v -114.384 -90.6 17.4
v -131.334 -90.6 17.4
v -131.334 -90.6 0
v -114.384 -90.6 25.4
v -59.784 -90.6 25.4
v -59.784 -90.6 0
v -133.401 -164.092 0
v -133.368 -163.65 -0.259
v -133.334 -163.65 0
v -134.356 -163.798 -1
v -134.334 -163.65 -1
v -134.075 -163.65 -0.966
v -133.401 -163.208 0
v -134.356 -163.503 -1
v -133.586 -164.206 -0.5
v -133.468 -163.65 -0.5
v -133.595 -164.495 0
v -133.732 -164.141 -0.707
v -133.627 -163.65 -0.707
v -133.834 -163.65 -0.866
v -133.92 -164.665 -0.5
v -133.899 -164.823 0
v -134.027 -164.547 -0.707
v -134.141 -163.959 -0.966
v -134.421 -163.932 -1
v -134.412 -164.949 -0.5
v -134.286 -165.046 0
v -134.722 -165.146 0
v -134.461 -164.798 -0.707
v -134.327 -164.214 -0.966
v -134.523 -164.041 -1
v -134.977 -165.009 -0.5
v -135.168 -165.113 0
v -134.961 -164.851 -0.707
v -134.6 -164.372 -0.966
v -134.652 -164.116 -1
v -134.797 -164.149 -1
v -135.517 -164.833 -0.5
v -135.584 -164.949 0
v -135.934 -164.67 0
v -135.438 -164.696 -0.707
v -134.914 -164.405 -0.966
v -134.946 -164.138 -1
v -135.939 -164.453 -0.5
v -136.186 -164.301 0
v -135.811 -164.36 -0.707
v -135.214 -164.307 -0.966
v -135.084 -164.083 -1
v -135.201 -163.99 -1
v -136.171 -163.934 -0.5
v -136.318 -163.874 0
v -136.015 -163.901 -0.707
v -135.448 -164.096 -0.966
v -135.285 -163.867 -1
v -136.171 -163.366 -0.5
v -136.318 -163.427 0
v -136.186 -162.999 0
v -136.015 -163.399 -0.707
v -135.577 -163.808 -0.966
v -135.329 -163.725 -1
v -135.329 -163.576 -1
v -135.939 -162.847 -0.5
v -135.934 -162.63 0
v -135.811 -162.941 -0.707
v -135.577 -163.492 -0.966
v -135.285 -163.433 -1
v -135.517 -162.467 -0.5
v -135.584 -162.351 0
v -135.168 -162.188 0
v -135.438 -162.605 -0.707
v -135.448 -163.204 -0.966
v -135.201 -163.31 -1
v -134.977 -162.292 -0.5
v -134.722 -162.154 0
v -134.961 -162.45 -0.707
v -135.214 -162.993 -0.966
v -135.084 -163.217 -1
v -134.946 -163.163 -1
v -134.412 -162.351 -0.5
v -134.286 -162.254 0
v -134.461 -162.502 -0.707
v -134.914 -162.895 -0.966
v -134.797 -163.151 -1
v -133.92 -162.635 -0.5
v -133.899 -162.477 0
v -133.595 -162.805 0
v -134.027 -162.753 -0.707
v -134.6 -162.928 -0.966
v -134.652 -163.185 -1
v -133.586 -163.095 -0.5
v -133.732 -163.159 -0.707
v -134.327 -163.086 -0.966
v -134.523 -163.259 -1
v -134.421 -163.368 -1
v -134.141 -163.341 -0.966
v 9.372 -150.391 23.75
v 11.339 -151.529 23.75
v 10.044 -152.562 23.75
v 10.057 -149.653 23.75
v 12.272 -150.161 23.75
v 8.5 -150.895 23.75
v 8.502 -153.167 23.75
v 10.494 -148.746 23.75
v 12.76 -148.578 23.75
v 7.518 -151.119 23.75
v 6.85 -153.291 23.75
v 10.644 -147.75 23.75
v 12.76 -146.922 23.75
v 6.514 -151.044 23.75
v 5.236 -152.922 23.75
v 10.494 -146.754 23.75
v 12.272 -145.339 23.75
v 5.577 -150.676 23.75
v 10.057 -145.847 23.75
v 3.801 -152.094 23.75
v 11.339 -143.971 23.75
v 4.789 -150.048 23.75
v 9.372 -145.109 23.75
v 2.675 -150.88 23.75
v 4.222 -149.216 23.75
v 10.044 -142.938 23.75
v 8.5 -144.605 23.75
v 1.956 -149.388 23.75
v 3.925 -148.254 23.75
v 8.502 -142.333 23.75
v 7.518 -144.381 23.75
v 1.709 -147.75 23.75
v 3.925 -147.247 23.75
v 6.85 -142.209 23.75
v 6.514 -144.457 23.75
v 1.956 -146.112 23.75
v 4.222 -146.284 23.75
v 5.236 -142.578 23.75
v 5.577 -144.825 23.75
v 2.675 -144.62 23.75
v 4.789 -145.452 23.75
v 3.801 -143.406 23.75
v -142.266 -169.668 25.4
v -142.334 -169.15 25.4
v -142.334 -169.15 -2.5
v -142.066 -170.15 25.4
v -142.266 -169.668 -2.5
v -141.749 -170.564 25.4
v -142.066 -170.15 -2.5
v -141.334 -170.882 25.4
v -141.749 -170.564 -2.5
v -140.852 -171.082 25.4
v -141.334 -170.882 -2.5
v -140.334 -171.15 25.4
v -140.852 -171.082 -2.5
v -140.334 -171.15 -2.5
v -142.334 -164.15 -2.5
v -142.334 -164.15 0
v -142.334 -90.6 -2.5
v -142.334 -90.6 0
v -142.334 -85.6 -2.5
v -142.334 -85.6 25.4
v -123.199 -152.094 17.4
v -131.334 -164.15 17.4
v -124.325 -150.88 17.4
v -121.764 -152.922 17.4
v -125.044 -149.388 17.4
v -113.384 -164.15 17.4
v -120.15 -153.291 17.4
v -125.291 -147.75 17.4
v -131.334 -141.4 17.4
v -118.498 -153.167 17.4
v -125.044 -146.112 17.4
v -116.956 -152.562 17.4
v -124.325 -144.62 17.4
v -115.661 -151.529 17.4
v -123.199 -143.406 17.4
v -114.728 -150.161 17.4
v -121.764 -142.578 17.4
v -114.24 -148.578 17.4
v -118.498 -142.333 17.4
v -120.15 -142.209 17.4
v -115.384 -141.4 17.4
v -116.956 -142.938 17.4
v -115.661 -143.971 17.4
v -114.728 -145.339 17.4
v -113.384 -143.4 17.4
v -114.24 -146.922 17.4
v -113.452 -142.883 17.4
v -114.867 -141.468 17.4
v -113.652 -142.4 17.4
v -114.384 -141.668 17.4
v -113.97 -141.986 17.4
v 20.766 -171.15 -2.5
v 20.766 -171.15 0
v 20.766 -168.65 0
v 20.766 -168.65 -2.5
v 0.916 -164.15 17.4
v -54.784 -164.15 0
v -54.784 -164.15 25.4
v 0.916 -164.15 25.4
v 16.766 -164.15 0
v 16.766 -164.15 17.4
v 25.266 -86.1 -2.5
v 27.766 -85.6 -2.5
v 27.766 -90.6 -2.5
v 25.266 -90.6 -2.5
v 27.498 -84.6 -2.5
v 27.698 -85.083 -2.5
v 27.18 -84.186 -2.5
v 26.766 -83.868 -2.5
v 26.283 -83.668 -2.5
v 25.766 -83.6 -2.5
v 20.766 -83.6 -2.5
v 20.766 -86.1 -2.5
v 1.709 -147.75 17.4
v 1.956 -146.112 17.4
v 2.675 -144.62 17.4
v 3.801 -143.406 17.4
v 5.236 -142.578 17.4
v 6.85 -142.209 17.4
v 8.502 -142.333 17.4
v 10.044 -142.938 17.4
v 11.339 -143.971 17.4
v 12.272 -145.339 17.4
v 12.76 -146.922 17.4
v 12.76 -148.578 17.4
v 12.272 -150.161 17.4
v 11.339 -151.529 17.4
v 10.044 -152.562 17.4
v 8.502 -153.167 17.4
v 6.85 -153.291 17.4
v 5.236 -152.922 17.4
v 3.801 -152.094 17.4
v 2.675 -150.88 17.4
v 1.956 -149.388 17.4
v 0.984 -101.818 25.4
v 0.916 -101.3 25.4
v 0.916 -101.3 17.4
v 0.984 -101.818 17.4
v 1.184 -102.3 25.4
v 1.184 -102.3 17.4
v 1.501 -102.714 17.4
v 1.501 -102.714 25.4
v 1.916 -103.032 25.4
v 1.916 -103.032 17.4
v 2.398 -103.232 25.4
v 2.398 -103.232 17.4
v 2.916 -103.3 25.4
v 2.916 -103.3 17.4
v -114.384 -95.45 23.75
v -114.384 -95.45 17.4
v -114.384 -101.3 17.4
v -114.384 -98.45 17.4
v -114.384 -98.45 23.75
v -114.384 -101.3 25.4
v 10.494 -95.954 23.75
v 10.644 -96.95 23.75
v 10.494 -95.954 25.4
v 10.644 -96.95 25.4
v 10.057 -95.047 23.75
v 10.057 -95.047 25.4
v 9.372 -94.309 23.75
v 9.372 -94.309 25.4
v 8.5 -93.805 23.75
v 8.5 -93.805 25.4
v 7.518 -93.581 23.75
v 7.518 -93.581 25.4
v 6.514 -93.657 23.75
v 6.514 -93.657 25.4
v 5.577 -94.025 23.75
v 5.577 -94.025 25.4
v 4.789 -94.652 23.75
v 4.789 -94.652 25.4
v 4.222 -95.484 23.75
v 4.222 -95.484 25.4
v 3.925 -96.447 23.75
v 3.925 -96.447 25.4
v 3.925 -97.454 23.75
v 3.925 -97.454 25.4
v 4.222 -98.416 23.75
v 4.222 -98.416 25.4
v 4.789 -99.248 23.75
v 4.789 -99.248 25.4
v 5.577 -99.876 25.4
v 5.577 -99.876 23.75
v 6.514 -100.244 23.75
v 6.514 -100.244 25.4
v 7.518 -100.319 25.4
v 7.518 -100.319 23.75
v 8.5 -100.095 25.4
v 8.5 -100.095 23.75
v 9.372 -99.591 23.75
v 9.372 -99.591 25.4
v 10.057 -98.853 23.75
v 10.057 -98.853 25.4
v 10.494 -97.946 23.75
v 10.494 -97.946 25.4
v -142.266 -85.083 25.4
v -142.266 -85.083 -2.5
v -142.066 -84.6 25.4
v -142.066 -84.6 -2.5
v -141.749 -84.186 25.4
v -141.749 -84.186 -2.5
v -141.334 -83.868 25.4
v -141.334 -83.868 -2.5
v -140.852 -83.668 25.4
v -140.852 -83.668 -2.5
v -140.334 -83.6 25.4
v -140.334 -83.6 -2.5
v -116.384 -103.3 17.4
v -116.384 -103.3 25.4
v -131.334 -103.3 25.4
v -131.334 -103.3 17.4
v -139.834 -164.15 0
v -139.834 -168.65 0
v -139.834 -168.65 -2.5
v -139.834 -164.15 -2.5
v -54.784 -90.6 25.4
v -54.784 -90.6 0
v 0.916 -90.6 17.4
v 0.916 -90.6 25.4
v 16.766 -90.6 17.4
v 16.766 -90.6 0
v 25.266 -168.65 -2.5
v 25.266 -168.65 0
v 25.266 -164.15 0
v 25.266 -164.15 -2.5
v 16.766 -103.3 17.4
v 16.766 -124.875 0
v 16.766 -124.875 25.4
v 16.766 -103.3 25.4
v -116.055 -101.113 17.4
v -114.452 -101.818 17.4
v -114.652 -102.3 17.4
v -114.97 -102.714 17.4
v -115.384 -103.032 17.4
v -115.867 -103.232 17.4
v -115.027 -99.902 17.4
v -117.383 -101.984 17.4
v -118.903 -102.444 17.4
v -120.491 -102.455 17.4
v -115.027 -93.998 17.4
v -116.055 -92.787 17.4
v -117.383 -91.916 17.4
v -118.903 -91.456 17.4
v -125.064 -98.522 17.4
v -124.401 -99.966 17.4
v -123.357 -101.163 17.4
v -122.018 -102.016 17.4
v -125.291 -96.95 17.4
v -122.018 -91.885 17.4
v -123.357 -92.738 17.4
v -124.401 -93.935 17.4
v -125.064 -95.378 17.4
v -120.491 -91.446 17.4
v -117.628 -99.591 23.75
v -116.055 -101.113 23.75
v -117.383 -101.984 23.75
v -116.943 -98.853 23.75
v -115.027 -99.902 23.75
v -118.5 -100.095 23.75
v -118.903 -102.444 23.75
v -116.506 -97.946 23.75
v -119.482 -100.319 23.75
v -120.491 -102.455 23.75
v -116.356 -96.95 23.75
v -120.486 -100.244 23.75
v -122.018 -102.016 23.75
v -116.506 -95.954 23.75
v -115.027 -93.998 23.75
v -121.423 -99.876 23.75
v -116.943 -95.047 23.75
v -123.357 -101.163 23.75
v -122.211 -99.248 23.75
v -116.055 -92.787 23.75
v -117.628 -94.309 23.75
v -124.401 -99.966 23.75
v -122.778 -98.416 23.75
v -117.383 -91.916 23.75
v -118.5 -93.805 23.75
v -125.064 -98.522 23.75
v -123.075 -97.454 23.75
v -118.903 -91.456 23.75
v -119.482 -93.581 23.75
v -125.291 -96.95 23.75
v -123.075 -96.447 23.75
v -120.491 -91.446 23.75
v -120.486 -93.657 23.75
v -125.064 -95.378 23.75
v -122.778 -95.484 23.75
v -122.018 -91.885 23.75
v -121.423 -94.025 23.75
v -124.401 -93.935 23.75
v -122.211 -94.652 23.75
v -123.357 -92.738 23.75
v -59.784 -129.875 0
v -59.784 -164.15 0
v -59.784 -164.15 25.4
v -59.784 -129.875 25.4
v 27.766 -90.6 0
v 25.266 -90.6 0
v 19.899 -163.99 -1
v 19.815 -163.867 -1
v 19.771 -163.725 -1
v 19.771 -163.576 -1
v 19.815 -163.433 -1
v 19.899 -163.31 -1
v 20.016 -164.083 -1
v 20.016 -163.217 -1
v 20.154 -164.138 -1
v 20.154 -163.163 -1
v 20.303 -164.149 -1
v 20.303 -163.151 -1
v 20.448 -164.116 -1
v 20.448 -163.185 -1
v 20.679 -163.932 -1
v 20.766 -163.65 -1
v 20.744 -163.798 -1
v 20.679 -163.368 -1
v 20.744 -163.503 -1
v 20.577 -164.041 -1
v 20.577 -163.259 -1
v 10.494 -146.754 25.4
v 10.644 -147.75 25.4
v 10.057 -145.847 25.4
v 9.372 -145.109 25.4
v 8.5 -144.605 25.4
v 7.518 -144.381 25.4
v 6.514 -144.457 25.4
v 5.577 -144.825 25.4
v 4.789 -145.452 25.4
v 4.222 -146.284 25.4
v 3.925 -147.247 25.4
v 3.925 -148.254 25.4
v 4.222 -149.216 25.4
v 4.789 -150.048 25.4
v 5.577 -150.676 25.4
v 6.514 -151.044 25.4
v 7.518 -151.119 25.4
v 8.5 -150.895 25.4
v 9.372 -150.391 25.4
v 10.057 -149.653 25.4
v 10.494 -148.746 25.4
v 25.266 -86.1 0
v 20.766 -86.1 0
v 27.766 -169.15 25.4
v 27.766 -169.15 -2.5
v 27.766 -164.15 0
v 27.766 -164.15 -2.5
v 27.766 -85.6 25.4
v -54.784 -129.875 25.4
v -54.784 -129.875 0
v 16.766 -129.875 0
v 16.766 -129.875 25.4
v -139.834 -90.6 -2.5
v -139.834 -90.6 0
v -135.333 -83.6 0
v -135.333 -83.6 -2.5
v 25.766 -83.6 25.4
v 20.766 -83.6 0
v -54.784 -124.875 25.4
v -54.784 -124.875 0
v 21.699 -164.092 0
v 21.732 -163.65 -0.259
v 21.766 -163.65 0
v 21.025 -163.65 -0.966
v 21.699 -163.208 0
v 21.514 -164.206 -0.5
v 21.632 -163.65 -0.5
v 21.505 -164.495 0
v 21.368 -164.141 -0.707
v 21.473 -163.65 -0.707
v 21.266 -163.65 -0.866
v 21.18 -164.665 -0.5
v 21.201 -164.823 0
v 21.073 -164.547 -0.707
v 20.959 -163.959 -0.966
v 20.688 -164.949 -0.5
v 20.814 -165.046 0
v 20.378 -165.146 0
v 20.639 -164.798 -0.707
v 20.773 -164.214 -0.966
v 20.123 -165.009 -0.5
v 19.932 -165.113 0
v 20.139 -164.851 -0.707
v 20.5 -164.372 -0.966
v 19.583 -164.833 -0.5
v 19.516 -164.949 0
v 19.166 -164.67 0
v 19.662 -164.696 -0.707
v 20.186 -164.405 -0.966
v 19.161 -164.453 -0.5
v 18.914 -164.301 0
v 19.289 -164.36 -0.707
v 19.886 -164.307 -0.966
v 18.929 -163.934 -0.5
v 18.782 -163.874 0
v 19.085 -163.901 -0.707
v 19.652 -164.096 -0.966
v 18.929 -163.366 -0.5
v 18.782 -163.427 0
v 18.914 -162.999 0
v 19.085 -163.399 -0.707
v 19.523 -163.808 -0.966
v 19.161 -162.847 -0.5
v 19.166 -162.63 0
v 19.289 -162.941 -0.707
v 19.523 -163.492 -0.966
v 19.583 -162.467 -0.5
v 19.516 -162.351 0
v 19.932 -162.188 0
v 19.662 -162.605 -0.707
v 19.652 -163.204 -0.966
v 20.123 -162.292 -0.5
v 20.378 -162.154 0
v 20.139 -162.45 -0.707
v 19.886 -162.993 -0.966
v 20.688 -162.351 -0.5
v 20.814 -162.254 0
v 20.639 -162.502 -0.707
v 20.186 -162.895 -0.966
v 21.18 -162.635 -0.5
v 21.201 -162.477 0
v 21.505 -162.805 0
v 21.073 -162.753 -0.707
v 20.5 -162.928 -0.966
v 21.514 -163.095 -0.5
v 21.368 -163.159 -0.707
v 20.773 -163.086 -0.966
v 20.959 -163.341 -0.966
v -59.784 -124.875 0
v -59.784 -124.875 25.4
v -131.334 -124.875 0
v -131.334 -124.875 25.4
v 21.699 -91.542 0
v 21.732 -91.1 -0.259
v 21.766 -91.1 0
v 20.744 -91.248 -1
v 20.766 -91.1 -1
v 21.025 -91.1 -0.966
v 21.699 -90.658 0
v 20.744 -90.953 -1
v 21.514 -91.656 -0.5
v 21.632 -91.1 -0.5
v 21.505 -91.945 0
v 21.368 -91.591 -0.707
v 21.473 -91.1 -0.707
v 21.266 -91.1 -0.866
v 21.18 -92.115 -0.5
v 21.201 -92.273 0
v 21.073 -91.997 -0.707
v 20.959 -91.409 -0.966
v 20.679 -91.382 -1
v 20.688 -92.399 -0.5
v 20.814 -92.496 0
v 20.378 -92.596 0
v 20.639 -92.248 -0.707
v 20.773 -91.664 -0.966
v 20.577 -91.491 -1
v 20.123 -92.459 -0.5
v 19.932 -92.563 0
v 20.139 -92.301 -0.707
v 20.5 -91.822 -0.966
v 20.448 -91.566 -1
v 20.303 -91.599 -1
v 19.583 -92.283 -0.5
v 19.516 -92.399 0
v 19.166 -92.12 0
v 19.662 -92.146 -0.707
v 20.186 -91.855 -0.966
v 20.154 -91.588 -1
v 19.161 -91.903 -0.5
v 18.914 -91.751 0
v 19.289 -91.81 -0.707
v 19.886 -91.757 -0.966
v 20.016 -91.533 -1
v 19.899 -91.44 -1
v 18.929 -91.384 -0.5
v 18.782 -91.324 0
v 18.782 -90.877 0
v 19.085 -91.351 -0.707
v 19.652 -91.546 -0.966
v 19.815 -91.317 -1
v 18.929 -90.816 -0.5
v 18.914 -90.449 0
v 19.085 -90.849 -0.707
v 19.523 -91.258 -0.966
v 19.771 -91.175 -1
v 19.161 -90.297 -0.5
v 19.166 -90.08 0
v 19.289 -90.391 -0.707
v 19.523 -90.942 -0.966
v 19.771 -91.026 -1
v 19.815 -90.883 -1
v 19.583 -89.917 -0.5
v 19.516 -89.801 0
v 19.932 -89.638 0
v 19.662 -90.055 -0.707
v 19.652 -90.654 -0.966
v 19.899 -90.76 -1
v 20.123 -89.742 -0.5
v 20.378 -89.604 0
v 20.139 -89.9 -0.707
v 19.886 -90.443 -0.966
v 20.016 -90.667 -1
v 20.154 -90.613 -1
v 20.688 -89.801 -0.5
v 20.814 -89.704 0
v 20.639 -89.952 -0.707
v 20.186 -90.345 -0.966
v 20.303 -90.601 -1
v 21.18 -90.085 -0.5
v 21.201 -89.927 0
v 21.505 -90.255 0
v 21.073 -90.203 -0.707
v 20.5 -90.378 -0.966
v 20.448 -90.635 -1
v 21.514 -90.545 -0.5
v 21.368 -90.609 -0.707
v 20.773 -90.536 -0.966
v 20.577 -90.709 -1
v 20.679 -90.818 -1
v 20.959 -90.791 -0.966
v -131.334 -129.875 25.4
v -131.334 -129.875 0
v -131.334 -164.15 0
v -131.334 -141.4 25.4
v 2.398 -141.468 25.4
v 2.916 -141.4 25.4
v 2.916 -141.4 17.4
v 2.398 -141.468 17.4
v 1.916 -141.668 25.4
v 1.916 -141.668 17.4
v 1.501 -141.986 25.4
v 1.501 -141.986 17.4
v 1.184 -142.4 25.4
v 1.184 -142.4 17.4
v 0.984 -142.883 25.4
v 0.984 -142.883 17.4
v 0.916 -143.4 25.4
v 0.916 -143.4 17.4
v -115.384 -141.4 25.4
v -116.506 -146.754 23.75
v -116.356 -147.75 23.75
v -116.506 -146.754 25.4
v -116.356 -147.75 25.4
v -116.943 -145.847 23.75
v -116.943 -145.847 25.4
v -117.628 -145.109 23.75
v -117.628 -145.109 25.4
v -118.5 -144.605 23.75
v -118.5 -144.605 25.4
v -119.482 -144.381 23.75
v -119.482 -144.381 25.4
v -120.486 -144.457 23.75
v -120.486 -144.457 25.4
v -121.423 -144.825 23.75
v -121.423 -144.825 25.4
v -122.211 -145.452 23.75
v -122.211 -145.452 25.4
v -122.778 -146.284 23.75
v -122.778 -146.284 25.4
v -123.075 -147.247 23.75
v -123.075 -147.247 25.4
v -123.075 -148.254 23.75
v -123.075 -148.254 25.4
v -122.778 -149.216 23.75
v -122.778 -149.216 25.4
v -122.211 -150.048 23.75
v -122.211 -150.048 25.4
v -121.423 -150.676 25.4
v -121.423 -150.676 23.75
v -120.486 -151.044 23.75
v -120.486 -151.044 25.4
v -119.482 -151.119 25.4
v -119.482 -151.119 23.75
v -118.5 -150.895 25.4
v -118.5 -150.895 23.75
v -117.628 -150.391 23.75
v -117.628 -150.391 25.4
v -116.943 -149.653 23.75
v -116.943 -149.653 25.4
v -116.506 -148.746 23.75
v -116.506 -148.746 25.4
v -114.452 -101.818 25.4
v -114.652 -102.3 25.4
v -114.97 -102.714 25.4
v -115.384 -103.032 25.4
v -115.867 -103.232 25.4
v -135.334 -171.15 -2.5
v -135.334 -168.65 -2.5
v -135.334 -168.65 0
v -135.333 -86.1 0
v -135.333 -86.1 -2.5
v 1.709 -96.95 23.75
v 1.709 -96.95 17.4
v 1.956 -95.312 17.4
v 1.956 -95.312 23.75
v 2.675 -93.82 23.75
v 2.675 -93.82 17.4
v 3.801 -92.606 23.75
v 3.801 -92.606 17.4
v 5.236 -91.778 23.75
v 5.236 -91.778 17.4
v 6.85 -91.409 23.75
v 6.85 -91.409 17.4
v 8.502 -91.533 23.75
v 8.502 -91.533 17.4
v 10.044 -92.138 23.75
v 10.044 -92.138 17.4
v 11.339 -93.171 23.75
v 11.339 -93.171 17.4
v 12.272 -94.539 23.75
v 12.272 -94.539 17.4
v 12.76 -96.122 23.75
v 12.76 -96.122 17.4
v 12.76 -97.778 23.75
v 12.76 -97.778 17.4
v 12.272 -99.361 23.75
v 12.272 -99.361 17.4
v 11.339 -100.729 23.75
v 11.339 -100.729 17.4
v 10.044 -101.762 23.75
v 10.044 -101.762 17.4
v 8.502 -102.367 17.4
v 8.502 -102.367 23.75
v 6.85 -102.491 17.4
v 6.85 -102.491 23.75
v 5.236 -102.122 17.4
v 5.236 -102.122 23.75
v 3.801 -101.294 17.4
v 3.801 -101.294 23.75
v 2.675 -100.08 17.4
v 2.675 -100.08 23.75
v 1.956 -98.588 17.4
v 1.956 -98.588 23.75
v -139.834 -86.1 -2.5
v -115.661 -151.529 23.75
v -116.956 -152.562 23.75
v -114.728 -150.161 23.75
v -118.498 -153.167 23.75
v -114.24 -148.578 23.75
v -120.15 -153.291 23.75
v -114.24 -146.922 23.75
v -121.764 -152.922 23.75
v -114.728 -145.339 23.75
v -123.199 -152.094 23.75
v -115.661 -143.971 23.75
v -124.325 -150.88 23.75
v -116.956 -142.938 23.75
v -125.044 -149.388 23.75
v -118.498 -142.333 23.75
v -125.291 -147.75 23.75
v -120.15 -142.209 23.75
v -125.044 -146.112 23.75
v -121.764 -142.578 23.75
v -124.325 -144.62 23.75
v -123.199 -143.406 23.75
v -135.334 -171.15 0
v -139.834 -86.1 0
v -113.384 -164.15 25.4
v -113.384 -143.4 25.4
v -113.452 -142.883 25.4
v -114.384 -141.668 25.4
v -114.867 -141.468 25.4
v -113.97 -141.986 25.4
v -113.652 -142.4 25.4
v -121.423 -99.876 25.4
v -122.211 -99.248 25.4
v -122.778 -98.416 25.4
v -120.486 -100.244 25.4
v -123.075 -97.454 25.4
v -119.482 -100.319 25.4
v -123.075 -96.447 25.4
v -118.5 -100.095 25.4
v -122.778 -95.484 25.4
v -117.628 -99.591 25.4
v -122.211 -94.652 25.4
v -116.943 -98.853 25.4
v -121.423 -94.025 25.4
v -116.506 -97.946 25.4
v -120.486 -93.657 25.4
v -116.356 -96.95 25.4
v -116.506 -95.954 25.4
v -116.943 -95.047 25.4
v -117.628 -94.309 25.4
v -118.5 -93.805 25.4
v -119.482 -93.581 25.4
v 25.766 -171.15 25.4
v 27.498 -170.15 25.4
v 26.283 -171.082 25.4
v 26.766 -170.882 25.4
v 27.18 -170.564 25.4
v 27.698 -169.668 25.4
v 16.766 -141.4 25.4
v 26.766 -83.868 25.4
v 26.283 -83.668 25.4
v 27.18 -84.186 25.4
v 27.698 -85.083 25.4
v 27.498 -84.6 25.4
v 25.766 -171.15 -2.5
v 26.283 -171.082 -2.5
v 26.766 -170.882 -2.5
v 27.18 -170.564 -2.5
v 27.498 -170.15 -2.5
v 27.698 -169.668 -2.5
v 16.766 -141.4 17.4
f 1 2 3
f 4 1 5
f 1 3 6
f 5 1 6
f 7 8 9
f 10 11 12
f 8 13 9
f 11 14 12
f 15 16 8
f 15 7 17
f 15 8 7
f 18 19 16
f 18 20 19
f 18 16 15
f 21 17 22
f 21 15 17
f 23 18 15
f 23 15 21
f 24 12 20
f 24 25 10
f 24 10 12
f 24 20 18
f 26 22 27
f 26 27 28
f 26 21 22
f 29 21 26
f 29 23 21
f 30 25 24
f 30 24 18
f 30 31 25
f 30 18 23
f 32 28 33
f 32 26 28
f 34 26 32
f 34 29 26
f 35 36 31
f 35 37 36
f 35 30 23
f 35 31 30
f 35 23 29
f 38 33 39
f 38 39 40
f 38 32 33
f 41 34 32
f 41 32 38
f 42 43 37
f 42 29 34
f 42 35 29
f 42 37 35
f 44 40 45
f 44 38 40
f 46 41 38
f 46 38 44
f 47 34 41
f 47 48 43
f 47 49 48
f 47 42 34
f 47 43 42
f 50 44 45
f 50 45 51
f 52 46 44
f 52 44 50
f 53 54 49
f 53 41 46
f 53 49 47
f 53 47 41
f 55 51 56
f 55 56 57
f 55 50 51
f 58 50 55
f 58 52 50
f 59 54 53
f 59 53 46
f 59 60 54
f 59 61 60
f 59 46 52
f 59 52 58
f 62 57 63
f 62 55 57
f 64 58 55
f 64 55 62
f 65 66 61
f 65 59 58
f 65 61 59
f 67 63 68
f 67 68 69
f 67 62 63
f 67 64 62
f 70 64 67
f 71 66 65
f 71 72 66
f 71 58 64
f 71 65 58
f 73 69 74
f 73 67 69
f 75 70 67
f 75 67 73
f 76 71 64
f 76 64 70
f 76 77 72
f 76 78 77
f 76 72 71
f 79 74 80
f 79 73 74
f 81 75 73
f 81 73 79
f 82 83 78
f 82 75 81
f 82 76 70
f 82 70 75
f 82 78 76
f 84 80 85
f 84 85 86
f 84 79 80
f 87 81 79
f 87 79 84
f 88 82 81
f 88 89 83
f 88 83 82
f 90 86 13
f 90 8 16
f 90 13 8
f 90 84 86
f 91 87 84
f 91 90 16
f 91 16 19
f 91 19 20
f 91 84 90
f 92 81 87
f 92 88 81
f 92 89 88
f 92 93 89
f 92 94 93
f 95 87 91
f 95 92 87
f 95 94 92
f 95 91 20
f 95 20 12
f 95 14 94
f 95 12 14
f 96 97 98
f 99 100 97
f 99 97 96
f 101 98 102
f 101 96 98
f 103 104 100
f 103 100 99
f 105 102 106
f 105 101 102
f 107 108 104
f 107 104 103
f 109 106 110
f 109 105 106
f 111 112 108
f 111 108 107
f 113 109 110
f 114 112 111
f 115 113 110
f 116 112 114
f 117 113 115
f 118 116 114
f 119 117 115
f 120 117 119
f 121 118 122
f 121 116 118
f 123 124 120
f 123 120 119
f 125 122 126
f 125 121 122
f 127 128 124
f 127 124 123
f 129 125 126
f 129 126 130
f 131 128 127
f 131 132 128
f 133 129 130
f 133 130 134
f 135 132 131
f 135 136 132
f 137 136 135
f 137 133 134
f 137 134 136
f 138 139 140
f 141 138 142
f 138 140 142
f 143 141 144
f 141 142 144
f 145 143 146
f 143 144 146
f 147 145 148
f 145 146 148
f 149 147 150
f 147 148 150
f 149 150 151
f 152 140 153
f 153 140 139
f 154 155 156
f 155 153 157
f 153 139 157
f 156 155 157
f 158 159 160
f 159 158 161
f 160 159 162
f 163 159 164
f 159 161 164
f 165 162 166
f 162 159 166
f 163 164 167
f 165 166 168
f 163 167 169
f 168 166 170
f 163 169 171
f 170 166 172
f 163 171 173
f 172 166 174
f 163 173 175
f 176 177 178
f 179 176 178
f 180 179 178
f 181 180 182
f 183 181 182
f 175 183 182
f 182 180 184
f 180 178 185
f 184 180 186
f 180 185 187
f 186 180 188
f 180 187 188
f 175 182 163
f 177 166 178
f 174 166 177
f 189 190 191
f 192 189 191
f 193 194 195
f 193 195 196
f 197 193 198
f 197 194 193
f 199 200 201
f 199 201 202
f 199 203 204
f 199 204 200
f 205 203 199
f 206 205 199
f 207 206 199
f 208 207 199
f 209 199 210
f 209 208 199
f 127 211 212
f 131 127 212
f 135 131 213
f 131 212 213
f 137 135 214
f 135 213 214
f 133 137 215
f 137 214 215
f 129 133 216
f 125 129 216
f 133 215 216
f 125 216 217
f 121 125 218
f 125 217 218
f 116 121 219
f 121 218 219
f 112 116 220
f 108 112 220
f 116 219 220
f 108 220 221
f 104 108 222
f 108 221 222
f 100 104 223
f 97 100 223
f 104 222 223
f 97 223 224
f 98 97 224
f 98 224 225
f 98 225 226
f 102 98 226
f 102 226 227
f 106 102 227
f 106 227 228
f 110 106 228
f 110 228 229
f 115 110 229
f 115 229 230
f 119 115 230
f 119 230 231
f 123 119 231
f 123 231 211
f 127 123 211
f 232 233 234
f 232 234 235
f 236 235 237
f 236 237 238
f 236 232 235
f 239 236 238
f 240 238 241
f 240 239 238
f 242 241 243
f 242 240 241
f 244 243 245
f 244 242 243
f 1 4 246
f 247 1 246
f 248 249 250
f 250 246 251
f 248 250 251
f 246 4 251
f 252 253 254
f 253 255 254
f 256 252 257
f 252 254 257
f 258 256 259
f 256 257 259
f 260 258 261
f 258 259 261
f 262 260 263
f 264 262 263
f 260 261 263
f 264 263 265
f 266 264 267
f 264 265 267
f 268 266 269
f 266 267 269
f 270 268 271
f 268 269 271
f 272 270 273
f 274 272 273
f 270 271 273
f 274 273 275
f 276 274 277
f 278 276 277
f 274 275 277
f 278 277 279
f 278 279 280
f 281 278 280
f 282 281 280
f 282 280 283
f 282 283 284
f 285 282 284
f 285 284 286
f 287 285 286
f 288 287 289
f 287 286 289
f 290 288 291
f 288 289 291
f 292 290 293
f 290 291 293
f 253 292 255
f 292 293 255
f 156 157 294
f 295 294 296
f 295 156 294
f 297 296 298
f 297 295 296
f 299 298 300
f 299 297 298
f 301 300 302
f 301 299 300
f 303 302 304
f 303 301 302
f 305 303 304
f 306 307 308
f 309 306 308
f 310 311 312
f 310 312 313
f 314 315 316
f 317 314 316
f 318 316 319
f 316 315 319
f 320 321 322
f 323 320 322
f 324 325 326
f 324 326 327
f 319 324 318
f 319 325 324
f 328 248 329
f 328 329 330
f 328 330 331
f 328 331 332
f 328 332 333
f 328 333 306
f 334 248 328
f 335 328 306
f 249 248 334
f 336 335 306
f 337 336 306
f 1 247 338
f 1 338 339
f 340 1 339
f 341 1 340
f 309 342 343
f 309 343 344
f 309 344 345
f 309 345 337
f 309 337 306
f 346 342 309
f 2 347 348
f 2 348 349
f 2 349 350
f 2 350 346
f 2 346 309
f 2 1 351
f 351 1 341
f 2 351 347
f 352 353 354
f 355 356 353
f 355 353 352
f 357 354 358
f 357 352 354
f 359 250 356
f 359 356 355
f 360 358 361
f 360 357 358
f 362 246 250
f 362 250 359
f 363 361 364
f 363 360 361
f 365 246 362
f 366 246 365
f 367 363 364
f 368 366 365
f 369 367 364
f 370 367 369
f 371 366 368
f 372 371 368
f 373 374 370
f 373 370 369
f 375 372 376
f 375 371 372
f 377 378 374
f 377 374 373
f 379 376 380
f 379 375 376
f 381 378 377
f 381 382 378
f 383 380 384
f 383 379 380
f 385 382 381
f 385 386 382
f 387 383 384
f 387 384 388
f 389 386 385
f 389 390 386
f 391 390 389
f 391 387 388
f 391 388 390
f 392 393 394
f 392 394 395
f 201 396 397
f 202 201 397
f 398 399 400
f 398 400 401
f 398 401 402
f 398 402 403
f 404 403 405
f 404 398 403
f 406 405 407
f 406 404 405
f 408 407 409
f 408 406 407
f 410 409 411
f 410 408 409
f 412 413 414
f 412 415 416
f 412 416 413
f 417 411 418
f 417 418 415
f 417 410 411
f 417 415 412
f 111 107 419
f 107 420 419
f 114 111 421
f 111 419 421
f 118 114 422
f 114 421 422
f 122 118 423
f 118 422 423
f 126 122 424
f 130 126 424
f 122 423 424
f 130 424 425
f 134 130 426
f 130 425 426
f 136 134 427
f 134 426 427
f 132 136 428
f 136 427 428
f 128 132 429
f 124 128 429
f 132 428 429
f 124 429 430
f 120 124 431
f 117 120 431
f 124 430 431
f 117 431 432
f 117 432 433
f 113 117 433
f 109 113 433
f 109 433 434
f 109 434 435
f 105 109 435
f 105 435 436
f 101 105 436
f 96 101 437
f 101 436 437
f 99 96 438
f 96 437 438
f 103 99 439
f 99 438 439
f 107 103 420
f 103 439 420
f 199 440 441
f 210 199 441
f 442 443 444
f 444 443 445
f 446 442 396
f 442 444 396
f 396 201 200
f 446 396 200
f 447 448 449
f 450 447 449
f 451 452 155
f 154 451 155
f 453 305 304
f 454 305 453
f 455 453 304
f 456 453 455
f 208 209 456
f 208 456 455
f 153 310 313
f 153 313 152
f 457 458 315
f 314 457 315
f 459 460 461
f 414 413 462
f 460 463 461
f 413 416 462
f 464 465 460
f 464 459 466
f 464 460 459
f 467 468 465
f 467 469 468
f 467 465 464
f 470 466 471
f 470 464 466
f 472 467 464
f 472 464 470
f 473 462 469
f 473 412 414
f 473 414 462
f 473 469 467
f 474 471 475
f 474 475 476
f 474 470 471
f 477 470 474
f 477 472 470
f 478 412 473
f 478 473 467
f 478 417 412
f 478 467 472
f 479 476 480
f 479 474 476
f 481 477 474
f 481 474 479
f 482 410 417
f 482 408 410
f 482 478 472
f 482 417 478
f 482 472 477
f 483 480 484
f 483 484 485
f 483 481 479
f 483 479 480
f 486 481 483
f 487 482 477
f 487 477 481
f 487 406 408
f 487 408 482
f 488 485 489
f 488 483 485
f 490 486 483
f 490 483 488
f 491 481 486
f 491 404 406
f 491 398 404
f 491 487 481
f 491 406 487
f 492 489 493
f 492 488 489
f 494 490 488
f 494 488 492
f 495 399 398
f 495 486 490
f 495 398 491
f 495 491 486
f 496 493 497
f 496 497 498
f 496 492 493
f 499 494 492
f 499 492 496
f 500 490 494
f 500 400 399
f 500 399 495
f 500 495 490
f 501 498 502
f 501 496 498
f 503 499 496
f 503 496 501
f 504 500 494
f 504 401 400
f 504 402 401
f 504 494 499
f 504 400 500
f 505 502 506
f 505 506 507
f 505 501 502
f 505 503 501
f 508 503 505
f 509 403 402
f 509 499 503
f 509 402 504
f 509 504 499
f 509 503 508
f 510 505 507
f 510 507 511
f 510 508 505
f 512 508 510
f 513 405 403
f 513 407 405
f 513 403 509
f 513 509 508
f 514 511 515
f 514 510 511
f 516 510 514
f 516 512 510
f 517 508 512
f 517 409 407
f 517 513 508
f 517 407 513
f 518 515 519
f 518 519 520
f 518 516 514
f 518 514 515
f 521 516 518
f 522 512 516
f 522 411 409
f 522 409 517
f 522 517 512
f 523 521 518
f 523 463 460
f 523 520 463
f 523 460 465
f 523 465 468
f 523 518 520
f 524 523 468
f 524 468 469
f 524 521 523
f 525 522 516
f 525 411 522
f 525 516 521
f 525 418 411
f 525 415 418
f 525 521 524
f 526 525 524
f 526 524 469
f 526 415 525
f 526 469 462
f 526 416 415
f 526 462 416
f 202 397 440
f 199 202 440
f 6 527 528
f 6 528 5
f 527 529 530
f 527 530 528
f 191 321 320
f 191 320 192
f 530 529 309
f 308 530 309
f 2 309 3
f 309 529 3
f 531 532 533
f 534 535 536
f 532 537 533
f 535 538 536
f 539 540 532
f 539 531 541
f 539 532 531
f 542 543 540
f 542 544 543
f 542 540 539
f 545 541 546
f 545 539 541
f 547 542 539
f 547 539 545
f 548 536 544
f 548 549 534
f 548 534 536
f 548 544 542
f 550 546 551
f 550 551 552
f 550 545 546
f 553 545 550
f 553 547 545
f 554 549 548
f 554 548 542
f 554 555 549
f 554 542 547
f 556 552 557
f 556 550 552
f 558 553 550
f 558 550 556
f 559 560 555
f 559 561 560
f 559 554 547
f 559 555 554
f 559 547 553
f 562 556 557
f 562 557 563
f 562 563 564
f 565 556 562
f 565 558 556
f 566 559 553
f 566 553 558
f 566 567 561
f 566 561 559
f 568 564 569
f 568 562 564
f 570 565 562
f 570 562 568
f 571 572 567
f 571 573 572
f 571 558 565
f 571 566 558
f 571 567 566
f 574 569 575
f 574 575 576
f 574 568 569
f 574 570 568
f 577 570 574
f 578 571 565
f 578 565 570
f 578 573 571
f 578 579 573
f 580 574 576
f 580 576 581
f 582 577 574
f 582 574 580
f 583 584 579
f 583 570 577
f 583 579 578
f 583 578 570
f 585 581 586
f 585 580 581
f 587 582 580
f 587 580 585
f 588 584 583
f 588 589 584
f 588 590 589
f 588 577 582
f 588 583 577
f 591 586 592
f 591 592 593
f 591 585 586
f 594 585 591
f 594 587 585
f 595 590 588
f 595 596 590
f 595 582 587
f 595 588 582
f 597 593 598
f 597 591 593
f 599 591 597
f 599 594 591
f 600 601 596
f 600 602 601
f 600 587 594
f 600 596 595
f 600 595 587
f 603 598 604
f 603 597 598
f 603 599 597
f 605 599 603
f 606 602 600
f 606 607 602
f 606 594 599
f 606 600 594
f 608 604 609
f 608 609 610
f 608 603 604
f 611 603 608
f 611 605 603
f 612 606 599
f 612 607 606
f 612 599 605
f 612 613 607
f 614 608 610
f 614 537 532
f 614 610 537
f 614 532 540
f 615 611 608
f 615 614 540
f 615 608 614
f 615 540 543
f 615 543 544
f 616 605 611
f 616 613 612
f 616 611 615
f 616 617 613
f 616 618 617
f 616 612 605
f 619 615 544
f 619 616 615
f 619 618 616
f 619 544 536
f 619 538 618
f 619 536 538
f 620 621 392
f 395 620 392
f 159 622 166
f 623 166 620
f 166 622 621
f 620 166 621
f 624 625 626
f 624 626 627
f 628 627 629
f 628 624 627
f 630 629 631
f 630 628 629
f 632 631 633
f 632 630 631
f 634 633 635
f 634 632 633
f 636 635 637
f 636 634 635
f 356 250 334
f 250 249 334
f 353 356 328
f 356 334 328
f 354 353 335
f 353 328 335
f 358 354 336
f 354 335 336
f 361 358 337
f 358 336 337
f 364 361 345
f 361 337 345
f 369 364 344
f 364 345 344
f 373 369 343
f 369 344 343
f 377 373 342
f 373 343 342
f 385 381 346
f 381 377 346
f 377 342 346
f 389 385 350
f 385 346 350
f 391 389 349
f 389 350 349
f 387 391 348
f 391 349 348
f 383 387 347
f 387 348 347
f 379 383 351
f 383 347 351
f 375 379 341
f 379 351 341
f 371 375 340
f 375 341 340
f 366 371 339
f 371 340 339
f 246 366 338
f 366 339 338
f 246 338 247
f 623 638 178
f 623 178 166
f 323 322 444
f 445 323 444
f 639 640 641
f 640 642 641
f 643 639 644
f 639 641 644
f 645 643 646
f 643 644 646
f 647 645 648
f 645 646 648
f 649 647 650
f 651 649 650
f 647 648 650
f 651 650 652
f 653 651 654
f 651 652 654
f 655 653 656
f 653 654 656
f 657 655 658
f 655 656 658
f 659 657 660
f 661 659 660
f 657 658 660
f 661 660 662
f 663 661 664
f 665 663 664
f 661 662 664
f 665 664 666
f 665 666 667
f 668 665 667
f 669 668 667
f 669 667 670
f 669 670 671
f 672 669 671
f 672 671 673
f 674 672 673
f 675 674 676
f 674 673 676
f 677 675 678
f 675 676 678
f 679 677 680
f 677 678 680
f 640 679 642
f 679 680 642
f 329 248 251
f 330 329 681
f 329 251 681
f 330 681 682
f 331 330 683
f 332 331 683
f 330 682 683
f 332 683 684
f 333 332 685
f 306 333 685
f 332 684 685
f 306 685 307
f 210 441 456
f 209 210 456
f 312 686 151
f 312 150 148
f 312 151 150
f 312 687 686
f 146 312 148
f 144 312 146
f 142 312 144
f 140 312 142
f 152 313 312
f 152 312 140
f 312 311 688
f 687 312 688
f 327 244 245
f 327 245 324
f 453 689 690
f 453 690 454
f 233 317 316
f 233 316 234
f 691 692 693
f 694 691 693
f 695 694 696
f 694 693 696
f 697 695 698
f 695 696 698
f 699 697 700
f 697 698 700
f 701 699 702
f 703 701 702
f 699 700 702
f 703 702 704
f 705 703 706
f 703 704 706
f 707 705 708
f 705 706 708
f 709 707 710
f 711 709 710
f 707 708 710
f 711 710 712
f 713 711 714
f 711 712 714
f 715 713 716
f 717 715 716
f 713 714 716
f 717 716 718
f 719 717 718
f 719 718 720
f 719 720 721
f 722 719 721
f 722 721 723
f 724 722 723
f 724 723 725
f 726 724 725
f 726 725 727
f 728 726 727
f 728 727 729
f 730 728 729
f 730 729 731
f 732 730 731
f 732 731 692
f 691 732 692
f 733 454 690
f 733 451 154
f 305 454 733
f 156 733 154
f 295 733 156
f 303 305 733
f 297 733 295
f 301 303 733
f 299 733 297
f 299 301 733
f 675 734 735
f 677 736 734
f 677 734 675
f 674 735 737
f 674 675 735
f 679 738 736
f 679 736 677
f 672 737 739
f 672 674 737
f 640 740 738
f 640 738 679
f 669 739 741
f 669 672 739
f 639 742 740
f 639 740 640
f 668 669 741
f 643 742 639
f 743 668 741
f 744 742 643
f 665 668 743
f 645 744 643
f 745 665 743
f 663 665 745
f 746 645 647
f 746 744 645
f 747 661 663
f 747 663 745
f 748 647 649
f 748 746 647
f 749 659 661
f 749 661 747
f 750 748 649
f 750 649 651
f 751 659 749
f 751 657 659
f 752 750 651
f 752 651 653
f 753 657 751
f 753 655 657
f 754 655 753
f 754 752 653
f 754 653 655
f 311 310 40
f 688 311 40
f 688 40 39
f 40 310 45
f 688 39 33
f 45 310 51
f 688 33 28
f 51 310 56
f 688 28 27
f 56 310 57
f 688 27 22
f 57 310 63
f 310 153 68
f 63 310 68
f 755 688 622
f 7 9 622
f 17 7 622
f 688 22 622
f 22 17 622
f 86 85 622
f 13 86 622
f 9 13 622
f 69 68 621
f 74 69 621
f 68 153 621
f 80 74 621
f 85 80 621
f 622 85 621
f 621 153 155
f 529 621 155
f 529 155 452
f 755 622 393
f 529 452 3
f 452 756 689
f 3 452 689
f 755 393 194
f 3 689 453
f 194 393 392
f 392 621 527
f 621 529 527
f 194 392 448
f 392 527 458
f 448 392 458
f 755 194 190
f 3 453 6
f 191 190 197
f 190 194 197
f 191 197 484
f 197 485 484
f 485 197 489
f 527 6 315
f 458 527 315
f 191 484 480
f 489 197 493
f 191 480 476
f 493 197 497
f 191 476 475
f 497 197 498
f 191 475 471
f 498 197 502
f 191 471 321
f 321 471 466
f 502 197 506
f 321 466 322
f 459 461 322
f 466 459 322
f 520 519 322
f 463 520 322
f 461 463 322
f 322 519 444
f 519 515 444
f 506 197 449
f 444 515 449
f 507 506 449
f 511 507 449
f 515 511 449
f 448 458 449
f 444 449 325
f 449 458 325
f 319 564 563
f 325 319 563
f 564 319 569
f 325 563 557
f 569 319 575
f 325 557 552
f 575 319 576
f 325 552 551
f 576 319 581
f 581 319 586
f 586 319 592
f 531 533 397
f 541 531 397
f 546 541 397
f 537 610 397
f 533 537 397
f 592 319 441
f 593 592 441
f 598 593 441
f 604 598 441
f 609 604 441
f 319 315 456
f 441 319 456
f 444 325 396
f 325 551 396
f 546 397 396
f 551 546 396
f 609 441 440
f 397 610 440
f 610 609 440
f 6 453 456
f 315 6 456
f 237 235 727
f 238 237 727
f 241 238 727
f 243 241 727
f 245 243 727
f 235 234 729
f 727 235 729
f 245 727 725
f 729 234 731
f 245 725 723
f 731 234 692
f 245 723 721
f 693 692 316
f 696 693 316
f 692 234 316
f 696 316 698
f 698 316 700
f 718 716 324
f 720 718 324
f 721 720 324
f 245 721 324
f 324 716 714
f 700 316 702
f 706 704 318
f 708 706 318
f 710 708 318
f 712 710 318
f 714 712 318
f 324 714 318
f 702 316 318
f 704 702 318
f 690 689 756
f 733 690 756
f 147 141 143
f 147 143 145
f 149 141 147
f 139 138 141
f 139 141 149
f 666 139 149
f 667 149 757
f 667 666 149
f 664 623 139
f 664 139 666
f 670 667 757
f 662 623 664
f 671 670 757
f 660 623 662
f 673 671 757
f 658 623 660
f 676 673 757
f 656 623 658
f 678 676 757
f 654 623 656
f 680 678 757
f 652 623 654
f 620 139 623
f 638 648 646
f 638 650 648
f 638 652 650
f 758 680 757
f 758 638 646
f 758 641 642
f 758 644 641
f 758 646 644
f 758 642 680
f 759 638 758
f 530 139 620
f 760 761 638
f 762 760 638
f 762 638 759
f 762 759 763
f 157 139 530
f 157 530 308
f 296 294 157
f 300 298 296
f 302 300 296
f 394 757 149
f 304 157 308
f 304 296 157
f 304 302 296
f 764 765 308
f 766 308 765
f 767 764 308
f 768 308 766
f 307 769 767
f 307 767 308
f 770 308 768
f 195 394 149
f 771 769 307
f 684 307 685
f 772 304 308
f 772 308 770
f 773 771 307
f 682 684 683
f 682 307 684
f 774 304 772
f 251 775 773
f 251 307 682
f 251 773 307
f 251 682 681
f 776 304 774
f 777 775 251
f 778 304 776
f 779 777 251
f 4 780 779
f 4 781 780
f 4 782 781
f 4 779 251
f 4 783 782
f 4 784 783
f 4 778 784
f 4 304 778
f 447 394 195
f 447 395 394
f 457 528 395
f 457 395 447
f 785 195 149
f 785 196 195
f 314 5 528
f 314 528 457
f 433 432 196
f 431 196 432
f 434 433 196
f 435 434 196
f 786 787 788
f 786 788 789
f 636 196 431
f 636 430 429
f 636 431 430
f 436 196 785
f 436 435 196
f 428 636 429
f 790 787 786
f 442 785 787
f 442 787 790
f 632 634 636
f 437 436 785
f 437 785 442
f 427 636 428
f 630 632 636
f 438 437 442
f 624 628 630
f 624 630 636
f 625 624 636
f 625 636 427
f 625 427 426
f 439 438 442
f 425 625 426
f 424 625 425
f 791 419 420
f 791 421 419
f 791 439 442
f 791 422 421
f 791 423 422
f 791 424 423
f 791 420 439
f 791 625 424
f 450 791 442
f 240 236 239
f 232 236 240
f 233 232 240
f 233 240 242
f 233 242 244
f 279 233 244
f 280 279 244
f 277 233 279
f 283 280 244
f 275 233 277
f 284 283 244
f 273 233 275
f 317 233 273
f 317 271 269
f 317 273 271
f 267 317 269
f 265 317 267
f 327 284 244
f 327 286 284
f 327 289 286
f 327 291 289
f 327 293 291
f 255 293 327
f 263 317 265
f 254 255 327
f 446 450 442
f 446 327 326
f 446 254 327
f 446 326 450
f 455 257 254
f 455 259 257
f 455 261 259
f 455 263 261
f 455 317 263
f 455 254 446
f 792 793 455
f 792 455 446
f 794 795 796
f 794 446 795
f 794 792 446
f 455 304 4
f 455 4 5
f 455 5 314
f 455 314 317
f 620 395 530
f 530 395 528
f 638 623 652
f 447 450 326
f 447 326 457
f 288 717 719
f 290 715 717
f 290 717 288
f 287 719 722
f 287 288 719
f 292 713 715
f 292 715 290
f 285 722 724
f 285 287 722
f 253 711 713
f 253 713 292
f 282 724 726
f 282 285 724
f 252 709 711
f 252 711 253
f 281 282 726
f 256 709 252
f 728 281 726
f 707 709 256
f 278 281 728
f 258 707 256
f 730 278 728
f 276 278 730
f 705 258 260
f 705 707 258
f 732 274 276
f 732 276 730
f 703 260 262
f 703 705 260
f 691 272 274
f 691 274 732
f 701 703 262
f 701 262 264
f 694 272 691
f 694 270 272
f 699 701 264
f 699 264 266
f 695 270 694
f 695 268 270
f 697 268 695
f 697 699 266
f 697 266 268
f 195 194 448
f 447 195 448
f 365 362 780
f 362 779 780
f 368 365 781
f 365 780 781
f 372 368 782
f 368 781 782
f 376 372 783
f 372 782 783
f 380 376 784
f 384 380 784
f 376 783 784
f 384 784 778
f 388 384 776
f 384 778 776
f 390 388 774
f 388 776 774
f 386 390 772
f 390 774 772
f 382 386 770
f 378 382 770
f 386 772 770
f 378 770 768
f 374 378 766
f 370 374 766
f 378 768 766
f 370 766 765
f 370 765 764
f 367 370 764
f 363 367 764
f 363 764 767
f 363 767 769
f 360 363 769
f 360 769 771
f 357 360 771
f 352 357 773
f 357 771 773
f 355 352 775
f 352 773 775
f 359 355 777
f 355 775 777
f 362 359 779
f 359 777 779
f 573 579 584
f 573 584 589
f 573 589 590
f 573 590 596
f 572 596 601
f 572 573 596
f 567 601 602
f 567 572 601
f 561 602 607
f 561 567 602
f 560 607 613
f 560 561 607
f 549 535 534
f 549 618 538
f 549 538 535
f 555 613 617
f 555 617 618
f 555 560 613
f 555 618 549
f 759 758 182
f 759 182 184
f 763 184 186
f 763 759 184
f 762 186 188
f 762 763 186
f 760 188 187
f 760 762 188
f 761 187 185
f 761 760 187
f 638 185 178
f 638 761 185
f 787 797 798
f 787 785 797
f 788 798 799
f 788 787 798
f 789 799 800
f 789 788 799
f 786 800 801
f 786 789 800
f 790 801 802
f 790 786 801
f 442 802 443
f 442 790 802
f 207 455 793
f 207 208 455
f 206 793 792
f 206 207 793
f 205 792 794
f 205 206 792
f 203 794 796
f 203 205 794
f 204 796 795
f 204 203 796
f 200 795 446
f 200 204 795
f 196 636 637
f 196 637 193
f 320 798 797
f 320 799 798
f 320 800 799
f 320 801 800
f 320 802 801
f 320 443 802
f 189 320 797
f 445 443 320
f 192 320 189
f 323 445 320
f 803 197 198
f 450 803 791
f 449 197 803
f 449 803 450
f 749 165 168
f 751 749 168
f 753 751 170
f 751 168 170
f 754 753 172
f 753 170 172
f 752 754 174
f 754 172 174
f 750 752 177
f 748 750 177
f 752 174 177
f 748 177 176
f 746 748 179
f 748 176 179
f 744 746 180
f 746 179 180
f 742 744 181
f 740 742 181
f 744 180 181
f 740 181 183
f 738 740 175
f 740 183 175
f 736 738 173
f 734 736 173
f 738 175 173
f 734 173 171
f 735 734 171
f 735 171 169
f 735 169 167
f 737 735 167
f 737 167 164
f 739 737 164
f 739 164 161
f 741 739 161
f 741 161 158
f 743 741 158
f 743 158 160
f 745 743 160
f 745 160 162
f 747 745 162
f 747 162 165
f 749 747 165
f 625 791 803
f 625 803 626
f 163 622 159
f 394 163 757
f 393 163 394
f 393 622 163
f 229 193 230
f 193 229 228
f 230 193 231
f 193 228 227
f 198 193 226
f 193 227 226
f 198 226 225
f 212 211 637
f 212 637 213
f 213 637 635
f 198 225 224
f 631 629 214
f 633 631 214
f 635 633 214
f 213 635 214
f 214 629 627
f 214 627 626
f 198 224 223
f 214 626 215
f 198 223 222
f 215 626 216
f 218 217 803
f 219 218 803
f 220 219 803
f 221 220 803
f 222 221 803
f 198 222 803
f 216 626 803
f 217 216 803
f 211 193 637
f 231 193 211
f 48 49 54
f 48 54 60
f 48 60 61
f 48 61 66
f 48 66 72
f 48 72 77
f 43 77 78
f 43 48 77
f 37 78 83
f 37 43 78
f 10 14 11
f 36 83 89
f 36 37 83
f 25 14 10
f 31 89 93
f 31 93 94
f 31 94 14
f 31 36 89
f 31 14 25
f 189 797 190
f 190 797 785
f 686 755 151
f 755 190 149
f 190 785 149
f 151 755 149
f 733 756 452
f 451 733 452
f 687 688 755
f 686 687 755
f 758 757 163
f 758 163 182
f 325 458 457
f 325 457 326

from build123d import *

# Parameters (mm, degrees)
SKETCH1_W                                        = 170.1
SKETCH1_H                                        = 87.55
SKETCH1_W_2                                      = 148.1
SKETCH1_H_2                                      = 73.55
SKETCH1_W_3                                      = 71.55
SKETCH1_H_3                                      = 5
SKETCH1_W_4                                      = 5
SKETCH1_H_4                                      = 34.275
BOSS_EXTRUDE1_DEPTH                              = 25.4
SKETCH2_W                                        = 2.5
SKETCH2_H                                        = 4.5
SKETCH2_W_2                                      = 4.501529918
SKETCH2_H_2                                      = 2.5
SKETCH2_W_3                                      = 4.5
BOSS_EXTRUDE2_DEPTH                              = 2.5
SKETCH3_R                                        = 1.5
BOSS_EXTRUDE3_DEPTH                              = 1
BOSS_EXTRUDE4_DEPTH                              = 8
CBORE_FOR_1_4_SOCKET_HEAD_CAP_SCREW1_D           = 6.7564
CBORE_FOR_1_4_SOCKET_HEAD_CAP_SCREW1_CBORE_D     = 11.1125
CBORE_FOR_1_4_SOCKET_HEAD_CAP_SCREW1_CBORE_DEPTH = 6.35
FILLET1_R                                        = 1
FILLET2_R                                        = 2


with BuildPart() as part:
    # Sketch1 → Boss-Extrude1 (new body)
    # profile 1 of 6: a face of its own
    with BuildSketch(Plane.XY):
        with Locations((-57.284342841, -127.375162174)):
            Rectangle(SKETCH1_W, SKETCH1_H)
        with Locations((-57.284342841, -127.375162174)):
            Rectangle(SKETCH1_W_2, SKETCH1_H_2, mode=Mode.SUBTRACT)
    # profile 2 of 6: a face of its own
    with BuildSketch(Plane.XY):
        with Locations((-95.559342841, -127.375162174)):
            Rectangle(SKETCH1_W_3, SKETCH1_H_3)
    # profile 3 of 6: a face of its own
    with BuildSketch(Plane.XY):
        with Locations((-57.284342841, -107.737662174)):
            Rectangle(SKETCH1_W_4, SKETCH1_H_4)
    # profile 4 of 6: a face of its own
    with BuildSketch(Plane.XY):
        with Locations((-19.009342841, -127.375162174)):
            Rectangle(SKETCH1_W_3, SKETCH1_H_3)
    # profile 5 of 6: a face of its own
    with BuildSketch(Plane.XY):
        with Locations((-57.284342841, -147.012662174)):
            Rectangle(SKETCH1_W_4, SKETCH1_H_4)
    # profile 6 of 6: a face of its own
    with BuildSketch(Plane.XY):
        with Locations((-57.284342841, -127.375162174)):
            Rectangle(SKETCH1_W_4, SKETCH1_H_3)
    extrude(amount=BOSS_EXTRUDE1_DEPTH)

    # Sketch2 → Boss-Extrude2 (add)
    with BuildSketch(Plane(origin=(0, 0, 0), x_dir=(-1, 0, 0), z_dir=(0, 0, -1))):
        Polygon((135.334342841, -168.650162174), (135.334342841, -171.150162174), (142.334342841, -171.150162174), (142.334342841, -168.650162174), (139.834342841, -168.650162174), align=None)
        with Locations((141.084342841, -166.400162174)):
            Rectangle(SKETCH2_W, SKETCH2_H)
        Polygon((139.834342841, -90.600162174), (142.334342841, -90.600162174), (142.334342841, -83.600162174), (139.834342841, -83.600162174), (139.834342841, -86.100162174), align=None)
        with Locations((137.583577882, -84.850162174)):
            Rectangle(SKETCH2_W_2, SKETCH2_H_2)
        Polygon((-27.765657159, -83.600162174), (-27.765657159, -90.600162174), (-25.265657159, -90.600162174), (-25.265657159, -86.100162174), (-25.265657159, -83.600162174), align=None)
        with Locations((-23.015657159, -84.850162174)):
            Rectangle(SKETCH2_W_3, SKETCH2_H_2)
        Polygon((-27.765657159, -164.150162174), (-27.765657159, -171.150162174), (-25.265657159, -171.150162174), (-25.265657159, -168.650162174), (-25.265657159, -164.150162174), align=None)
        with Locations((-23.015657159, -169.900162174)):
            Rectangle(SKETCH2_W_3, SKETCH2_H_2)
    extrude(amount=BOSS_EXTRUDE2_DEPTH)

    # Sketch3 → Boss-Extrude3 (add)
    with BuildSketch(Plane(origin=(0, 0, 0), x_dir=(-1, 0, 0), z_dir=(0, 0, -1))):
        with Locations(Location((-20.265657159, -163.650162174, 0), (0, 0, 180))):
            Circle(SKETCH3_R)
        with Locations(Location((-20.265657159, -91.100162174, 0), (0, 0, 180))):
            Circle(SKETCH3_R)
        with Locations(Location((134.834342841, -163.650162174, 0), (0, 0, 180))):
            Circle(SKETCH3_R)
    extrude(amount=BOSS_EXTRUDE3_DEPTH)

    # Sketch4 → Boss-Extrude4 (add)
    with BuildSketch(Plane.XY.offset(25.4)):
        with BuildLine():
            Line((16.765657159, -90.600162174), (0.915657159, -90.600162174))
            Line((0.915657159, -90.600162174), (0.915657159, -101.300162174))
            ThreePointArc((0.915657159, -101.300162174), (1.501443597, -102.714375736), (2.915657159, -103.300162174))
            Line((2.915657159, -103.300162174), (16.765657159, -103.300162174))
            Line((16.765657159, -103.300162174), (16.765657159, -90.600162174))
        make_face()
        with BuildLine():
            Line((-131.334342841, -164.150162174), (-113.384342841, -164.150162174))
            Line((-113.384342841, -164.150162174), (-113.384342841, -143.400162174))
            ThreePointArc((-113.384342841, -143.400162174), (-113.970129278, -141.985948611), (-115.384342841, -141.400162174))
            Line((-115.384342841, -141.400162174), (-131.334342841, -141.400162174))
            Line((-131.334342841, -141.400162174), (-131.334342841, -164.150162174))
        make_face()
        with BuildLine():
            Line((-131.334342841, -90.600162174), (-114.384342841, -90.600162174))
            Line((-114.384342841, -90.600162174), (-114.384342841, -101.300162174))
            ThreePointArc((-114.384342841, -101.300162174), (-114.970129278, -102.714375736), (-116.384342841, -103.300162174))
            Line((-116.384342841, -103.300162174), (-131.334342841, -103.300162174))
            Line((-131.334342841, -103.300162174), (-131.334342841, -90.600162174))
        make_face()
        with BuildLine():
            Line((16.765657159, -141.400162174), (2.915657159, -141.400162174))
            ThreePointArc((2.915657159, -141.400162174), (1.501443597, -141.985948611), (0.915657159, -143.400162174))
            Line((0.915657159, -143.400162174), (0.915657159, -164.150162174))
            Line((0.915657159, -164.150162174), (16.765657159, -164.150162174))
            Line((16.765657159, -164.150162174), (16.765657159, -141.400162174))
        make_face()
    extrude(amount=-BOSS_EXTRUDE4_DEPTH)

    # CBORE for 1/4 Socket Head Cap Screw1 (through all)
    with Locations(Plane(origin=(0, 0, 17.4), x_dir=(-1, 0, 0), z_dir=(0, 0, -1))):
        with Locations((-7.265657159, -147.750162174), (-7.265657159, -96.950162174), (119.734342841, -96.950162174), (119.734342841, -147.750162174)):
            CounterBoreHole(CBORE_FOR_1_4_SOCKET_HEAD_CAP_SCREW1_D / 2, CBORE_FOR_1_4_SOCKET_HEAD_CAP_SCREW1_CBORE_D / 2, CBORE_FOR_1_4_SOCKET_HEAD_CAP_SCREW1_CBORE_DEPTH)

    # Fillet1
    fillet1_edges = [part.edges().sort_by_distance(p)[0] for p in [
        (18.765657159, -163.650162174, -1),
        (18.765657159, -91.100162174, -1),
        (-136.334342841, -163.650162174, -1),
    ]]
    fillet(fillet1_edges, radius=FILLET1_R - 0.0001)  # a hair under: the kernel refuses the full size

    # Fillet2
    fillet2_edges = [part.edges().sort_by_distance(p)[0] for p in [
        (27.765657159, -83.600162174, 11.45),
        (27.765657159, -171.150162174, 11.45),
        (-142.334342841, -171.150162174, 11.45),
        (-142.334342841, -83.600162174, 11.45),
    ]]
    fillet(fillet2_edges, radius=FILLET2_R)


solid = part.part
